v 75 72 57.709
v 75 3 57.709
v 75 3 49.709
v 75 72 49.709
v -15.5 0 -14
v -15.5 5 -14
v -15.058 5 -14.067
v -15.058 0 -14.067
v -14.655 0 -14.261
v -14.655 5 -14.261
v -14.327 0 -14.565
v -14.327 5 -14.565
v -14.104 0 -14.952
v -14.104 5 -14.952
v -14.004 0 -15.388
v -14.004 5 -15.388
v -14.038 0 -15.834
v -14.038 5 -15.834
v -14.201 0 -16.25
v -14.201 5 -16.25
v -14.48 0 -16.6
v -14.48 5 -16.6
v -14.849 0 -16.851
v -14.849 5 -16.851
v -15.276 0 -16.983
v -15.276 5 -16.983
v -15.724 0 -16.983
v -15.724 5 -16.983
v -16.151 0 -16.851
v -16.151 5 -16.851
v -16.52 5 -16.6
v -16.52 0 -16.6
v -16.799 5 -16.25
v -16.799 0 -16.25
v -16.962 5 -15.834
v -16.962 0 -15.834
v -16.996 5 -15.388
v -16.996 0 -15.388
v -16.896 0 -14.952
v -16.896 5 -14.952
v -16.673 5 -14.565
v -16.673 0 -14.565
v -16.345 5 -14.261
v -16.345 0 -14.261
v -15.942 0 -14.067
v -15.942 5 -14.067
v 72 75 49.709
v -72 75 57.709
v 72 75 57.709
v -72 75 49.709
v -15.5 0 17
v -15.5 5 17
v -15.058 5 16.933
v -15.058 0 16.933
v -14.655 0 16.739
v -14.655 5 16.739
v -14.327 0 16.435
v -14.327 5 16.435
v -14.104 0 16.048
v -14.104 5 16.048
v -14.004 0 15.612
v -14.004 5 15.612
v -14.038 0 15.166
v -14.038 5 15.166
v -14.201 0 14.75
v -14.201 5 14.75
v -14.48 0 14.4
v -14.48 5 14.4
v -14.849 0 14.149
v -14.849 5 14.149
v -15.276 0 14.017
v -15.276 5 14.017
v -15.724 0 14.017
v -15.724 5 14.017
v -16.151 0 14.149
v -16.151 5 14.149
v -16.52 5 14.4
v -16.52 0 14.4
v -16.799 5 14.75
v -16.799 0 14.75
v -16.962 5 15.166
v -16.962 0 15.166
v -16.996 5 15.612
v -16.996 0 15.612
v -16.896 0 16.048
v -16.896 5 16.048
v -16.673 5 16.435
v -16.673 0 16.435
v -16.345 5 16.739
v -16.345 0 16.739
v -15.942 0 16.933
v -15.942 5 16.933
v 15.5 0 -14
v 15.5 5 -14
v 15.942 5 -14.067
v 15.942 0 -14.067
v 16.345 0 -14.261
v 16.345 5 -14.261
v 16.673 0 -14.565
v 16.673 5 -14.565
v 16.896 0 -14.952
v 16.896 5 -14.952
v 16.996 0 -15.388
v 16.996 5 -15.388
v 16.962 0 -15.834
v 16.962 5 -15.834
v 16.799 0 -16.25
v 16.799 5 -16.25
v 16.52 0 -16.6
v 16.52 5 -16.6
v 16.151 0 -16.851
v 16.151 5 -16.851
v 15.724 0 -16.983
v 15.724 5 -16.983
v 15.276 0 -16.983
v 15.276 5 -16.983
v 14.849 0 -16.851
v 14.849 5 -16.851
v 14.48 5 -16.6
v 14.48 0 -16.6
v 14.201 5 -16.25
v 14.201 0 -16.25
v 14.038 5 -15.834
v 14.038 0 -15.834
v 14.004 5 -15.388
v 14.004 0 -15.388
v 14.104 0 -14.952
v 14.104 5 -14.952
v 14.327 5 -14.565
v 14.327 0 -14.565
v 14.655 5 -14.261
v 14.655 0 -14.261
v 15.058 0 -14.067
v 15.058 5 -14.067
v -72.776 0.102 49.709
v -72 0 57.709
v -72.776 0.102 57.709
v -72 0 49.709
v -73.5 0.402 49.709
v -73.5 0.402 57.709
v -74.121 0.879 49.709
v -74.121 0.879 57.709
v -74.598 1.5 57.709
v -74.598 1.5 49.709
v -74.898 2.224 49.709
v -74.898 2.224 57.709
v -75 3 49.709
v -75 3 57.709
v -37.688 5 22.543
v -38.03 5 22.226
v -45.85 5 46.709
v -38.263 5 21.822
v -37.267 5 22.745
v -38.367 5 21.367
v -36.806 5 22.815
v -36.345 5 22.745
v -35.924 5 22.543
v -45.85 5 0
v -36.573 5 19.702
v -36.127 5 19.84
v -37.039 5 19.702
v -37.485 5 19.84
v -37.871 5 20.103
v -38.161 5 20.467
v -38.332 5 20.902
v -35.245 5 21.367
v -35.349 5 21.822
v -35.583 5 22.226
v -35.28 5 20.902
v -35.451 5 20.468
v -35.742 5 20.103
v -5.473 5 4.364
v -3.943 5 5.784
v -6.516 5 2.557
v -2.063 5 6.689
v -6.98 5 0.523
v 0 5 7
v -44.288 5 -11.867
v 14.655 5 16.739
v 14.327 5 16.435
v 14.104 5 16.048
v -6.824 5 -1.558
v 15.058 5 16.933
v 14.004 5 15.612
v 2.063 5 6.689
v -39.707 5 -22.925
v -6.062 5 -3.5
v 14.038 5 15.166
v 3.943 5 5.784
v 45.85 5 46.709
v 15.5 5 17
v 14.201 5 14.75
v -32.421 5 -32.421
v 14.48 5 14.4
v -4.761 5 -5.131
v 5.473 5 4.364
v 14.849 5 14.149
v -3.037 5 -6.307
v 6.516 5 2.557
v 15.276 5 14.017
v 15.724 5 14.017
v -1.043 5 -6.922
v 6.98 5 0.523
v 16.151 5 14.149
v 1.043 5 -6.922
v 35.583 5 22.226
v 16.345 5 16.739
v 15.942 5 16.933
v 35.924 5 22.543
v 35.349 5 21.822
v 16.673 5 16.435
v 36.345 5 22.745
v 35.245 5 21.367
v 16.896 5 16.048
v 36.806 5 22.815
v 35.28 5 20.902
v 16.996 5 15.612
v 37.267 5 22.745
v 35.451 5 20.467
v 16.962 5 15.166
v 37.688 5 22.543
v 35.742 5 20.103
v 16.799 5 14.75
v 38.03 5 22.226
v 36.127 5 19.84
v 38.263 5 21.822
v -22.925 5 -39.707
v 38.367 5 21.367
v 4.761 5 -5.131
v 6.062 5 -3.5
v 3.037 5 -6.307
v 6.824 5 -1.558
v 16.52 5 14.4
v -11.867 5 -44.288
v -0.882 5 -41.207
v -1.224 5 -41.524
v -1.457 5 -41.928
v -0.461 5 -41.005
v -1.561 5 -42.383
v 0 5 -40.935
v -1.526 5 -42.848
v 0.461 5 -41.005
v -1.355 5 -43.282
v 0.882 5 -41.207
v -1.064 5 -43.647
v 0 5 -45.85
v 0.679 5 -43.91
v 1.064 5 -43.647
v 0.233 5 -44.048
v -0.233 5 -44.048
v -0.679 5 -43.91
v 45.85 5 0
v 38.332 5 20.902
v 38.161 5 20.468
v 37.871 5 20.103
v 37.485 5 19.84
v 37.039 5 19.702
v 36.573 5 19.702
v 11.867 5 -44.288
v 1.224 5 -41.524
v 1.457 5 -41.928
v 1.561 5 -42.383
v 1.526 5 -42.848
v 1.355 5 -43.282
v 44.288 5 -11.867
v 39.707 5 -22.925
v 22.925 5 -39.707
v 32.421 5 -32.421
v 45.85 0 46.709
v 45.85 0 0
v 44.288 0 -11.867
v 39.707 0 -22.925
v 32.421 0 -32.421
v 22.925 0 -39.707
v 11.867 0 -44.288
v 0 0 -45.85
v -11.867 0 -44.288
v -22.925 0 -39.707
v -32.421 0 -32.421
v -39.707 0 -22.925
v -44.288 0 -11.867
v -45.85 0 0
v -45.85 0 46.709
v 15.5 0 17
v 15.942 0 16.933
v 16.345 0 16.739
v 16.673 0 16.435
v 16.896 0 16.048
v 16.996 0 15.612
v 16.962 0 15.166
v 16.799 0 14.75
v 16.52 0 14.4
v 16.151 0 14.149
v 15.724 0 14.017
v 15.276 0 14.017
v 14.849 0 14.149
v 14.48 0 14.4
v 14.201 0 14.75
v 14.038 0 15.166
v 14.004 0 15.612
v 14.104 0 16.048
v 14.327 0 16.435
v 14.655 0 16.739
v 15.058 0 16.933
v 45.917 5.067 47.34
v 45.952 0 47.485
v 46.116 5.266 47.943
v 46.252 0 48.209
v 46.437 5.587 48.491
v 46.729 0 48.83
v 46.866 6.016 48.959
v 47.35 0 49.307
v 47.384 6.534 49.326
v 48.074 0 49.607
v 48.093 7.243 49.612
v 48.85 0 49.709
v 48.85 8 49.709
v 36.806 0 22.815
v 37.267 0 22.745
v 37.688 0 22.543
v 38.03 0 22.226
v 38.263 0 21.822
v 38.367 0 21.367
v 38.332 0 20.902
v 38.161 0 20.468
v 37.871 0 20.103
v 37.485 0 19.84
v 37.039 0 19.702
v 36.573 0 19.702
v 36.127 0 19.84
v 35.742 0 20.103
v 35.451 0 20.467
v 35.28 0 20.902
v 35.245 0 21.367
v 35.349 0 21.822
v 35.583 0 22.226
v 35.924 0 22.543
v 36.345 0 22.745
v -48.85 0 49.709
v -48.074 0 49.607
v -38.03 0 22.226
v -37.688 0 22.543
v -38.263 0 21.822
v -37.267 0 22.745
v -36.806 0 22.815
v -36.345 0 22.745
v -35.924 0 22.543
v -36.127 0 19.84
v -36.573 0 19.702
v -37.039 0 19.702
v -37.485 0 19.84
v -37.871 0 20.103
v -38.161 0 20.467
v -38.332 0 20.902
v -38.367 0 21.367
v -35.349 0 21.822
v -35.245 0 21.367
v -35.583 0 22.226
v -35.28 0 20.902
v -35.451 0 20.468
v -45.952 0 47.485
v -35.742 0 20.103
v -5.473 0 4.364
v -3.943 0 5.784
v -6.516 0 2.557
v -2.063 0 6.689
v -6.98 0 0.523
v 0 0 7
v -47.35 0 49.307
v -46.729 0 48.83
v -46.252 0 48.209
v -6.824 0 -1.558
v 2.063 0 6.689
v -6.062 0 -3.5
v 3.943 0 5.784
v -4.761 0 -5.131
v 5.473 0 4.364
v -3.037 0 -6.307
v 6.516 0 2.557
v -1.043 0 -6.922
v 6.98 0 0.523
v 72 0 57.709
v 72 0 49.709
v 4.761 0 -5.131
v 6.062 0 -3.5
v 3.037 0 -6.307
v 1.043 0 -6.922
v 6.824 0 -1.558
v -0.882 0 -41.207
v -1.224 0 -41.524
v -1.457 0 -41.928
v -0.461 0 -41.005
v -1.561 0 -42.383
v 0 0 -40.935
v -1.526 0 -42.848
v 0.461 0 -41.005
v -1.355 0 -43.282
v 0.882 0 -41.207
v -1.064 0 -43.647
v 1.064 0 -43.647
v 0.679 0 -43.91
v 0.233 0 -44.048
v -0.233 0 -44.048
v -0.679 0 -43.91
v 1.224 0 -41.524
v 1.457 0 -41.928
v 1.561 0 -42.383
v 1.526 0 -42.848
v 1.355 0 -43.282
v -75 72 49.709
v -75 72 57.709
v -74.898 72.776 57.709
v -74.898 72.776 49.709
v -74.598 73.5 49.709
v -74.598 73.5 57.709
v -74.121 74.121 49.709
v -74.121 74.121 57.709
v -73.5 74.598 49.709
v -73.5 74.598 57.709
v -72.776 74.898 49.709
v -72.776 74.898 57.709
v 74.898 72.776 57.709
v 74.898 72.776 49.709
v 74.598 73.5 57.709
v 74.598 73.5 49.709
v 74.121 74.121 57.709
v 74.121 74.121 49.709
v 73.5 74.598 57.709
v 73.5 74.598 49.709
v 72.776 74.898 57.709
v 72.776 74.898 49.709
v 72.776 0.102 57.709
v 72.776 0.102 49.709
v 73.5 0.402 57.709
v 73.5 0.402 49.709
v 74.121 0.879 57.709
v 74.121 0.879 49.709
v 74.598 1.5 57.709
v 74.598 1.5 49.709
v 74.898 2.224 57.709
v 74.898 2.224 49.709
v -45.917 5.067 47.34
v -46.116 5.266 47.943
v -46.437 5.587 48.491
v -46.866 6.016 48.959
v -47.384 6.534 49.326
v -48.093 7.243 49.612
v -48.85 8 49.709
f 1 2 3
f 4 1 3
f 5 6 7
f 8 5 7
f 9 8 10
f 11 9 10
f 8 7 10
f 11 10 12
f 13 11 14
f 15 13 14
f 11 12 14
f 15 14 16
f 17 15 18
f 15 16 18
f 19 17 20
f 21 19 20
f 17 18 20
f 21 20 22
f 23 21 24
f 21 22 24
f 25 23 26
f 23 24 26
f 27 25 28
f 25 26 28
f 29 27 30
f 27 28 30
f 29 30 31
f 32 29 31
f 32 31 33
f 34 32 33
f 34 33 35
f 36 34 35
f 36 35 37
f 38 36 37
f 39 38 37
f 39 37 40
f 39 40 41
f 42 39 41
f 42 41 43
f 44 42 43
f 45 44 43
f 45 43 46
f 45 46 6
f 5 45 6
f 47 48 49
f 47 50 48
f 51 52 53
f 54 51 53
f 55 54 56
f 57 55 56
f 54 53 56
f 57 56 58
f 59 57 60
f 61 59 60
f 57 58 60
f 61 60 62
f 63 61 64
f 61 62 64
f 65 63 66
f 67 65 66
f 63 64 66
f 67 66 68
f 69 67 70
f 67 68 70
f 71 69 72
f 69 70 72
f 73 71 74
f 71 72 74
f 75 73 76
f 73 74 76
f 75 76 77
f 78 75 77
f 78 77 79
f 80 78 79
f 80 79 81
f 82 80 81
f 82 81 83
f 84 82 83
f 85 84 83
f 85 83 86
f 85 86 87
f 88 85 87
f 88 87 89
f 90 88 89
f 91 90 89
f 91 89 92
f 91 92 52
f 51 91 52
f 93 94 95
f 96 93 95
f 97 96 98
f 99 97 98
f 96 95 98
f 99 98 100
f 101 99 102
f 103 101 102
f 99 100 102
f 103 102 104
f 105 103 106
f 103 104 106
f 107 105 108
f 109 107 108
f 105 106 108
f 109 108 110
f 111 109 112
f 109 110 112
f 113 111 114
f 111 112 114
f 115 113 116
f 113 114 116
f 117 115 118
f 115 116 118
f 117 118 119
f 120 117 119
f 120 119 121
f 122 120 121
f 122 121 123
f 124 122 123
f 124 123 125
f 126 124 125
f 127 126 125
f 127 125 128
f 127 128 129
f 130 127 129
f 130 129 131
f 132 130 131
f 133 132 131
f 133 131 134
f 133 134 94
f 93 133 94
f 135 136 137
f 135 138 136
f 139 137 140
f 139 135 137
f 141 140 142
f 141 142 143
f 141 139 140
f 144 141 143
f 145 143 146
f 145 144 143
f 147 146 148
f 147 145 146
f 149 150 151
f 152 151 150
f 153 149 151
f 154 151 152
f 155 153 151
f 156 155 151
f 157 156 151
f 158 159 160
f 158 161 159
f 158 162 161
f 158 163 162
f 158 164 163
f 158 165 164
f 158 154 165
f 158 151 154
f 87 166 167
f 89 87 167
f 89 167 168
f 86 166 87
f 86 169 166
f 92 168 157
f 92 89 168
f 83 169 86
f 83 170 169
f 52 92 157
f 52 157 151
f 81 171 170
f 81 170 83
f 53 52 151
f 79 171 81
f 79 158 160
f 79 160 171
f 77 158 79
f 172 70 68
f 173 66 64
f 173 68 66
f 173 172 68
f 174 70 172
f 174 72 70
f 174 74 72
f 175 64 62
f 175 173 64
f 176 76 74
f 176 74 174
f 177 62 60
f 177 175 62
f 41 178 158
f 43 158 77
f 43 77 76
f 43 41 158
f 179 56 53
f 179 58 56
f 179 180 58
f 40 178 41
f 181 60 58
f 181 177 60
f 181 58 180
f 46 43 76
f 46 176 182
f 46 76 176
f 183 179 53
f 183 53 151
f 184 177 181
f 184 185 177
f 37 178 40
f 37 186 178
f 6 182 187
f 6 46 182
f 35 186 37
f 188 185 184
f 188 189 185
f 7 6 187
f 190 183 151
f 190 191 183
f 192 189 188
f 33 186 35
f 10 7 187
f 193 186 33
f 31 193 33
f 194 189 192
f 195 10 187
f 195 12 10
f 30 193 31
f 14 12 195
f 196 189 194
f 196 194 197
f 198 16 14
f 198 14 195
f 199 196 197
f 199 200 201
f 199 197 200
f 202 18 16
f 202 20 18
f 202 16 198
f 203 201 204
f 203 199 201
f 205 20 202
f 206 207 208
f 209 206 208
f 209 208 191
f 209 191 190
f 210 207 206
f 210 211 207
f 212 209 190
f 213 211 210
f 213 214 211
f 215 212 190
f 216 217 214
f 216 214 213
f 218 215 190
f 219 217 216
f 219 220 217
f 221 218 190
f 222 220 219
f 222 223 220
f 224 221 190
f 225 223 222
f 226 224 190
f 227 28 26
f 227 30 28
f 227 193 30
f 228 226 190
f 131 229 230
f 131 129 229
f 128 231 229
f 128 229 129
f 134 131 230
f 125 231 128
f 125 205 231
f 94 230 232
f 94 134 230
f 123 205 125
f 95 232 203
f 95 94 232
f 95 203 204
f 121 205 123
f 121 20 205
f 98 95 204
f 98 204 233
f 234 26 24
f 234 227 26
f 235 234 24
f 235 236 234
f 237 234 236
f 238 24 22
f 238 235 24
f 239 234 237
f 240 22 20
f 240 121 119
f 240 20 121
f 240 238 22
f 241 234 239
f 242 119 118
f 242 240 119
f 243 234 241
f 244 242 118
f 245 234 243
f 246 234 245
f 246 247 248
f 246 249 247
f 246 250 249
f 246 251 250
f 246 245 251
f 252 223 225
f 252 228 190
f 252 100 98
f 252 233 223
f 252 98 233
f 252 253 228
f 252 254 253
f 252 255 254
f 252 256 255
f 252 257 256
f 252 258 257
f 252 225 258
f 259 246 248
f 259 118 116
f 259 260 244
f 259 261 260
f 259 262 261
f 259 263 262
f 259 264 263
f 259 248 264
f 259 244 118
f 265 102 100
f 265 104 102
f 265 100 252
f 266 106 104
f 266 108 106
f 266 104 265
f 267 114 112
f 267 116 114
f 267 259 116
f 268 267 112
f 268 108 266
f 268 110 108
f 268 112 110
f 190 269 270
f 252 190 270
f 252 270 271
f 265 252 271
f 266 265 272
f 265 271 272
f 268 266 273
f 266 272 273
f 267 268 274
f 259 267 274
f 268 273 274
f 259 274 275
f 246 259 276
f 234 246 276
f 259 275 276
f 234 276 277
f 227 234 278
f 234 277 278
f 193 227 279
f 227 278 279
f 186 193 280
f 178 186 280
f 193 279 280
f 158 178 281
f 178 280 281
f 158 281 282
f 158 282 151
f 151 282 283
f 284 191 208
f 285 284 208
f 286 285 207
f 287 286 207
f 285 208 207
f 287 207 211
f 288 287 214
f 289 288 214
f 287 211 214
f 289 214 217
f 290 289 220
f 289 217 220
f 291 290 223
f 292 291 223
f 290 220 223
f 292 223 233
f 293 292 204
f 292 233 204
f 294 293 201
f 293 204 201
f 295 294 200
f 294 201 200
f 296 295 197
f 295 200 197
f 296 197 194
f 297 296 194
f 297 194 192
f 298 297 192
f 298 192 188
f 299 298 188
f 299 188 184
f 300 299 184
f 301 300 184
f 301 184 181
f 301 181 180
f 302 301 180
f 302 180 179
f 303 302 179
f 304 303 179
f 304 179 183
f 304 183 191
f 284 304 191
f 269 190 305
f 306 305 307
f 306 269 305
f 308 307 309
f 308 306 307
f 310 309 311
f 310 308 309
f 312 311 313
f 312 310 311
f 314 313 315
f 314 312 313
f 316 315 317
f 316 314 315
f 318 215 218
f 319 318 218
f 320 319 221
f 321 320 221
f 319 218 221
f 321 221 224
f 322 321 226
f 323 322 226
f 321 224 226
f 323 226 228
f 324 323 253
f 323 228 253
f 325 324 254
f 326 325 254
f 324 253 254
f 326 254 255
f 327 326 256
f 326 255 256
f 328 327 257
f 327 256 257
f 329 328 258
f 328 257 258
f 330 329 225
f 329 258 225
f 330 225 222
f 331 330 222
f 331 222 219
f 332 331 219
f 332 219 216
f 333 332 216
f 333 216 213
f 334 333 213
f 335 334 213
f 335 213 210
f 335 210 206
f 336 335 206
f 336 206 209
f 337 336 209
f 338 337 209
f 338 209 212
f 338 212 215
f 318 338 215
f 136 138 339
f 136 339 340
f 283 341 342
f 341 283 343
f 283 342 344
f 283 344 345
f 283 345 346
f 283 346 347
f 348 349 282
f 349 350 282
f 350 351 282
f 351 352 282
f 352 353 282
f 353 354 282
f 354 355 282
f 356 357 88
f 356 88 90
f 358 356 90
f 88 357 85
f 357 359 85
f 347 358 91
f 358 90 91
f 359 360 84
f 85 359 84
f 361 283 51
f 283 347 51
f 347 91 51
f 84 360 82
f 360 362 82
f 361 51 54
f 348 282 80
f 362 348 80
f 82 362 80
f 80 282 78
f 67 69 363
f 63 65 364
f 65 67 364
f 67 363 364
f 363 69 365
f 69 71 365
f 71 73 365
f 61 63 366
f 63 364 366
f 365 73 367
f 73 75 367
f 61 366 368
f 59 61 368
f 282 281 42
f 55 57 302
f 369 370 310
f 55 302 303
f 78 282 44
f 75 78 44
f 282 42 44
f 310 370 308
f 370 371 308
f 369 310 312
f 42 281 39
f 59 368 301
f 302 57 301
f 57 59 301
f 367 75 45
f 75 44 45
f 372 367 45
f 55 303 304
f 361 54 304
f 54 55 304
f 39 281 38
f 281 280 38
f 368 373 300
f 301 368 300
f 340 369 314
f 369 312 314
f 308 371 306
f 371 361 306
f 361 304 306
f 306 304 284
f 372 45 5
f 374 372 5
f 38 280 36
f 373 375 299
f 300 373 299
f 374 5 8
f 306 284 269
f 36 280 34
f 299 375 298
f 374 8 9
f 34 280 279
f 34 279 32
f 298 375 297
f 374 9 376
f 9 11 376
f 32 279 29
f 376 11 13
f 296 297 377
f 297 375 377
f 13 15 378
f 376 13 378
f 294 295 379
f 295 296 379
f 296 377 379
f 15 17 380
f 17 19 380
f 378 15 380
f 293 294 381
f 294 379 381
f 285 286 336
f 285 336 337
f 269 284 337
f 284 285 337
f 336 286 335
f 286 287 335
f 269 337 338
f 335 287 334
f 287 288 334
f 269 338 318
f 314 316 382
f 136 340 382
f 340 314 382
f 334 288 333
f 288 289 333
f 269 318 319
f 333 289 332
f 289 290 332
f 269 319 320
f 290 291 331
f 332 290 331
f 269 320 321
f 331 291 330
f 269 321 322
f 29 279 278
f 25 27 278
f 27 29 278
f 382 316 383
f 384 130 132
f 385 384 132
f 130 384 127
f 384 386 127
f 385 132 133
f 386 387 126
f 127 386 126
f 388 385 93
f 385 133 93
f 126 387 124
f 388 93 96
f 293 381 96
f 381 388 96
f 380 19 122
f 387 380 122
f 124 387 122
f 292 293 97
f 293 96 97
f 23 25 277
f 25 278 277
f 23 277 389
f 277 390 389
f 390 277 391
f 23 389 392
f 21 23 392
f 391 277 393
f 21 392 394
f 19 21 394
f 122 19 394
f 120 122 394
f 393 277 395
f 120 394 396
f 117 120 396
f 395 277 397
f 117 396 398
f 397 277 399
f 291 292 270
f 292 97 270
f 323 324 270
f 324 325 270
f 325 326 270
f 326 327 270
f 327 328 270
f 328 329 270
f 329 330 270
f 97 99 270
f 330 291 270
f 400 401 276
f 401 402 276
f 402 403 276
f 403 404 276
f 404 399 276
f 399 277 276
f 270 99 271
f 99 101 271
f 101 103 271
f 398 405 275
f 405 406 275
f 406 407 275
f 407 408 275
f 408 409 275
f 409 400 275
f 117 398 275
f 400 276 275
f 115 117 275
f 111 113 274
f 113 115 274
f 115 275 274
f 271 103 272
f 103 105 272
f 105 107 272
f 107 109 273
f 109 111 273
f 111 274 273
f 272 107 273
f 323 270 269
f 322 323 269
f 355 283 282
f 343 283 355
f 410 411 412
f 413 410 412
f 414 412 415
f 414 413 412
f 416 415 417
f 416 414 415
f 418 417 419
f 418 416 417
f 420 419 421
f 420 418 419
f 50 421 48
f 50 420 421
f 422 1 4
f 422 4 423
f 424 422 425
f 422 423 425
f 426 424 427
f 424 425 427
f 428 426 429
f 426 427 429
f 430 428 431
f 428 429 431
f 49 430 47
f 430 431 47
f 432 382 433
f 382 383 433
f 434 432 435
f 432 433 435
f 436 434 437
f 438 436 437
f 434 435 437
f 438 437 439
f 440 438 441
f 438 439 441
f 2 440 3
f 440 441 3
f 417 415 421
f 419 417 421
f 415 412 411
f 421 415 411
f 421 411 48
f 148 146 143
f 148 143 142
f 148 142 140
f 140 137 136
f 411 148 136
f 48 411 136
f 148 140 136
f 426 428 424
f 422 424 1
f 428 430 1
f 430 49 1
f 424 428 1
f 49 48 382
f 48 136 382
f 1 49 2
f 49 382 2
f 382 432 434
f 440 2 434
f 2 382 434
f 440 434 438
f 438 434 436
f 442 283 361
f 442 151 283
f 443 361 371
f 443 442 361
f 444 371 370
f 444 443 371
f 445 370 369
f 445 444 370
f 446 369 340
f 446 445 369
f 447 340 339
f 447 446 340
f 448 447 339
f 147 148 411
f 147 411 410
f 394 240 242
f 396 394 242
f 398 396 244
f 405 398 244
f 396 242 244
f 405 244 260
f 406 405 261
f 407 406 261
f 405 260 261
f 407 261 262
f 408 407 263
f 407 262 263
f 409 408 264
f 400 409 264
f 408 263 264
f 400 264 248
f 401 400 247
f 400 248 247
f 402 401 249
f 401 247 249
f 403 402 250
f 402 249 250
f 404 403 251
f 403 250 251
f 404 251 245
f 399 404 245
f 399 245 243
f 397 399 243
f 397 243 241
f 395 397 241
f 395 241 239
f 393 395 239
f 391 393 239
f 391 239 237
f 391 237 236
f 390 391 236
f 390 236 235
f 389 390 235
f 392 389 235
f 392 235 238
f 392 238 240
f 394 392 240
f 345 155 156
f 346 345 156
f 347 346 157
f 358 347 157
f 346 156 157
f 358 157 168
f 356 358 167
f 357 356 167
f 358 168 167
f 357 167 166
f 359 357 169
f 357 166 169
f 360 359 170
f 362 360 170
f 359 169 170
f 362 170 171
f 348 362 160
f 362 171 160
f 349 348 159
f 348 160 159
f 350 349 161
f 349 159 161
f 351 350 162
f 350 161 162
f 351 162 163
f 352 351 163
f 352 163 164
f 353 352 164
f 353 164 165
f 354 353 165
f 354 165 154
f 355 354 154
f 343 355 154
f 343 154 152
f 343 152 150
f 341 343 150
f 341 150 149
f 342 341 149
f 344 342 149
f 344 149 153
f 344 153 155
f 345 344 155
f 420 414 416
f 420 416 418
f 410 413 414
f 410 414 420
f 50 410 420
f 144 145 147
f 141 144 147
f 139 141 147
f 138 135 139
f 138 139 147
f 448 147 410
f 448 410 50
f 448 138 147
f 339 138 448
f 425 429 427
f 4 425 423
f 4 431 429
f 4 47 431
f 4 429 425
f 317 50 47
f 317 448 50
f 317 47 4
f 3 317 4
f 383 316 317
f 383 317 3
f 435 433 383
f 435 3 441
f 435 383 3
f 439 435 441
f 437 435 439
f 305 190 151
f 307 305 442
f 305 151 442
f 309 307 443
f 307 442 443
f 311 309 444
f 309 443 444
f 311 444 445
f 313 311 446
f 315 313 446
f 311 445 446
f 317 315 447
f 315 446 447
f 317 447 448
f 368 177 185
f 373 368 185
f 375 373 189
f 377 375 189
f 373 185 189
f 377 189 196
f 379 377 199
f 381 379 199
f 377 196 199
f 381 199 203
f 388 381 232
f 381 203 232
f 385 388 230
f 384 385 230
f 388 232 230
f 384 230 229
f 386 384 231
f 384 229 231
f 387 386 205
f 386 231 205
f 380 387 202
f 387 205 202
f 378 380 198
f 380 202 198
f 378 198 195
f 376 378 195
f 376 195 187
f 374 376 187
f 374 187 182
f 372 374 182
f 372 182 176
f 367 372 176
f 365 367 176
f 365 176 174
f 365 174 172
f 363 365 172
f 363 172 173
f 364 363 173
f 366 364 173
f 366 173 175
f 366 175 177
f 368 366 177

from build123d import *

# Parameters (mm, degrees)
SKETCH1_R           = 45.85
BOSS_EXTRUDE1_DEPTH = 5
SKETCH2_R           = 1.565
CUT_EXTRUDE1_DEPTH  = 10
SKETCH3_R           = 1.5
SKETCH3_R_2         = 7
CUT_EXTRUDE2_DEPTH  = 10
BOSS_EXTRUDE2_START = -5
BOSS_EXTRUDE2_DEPTH = 5
SKETCH5_W           = 150
SKETCH5_H           = 8
BOSS_EXTRUDE3_DEPTH = 75
FILLET1_R           = 3
FILLET2_R           = 3


with BuildPart() as part:
    # Sketch1 → Boss-Extrude1 (new body)
    with BuildSketch(Plane(origin=(0, 0, 0), x_dir=(1, 0, 0), z_dir=(0, 1, 0))):
        with Locations(Location((0, 0, 0), (0, 0, 270))):
            Circle(SKETCH1_R)
    extrude(amount=BOSS_EXTRUDE1_DEPTH)

    # Sketch2 → Cut-Extrude1 (cut)
    with BuildSketch(Plane(origin=(0, 5, 0), x_dir=(1, 0, 0), z_dir=(0, 1, 0))):
        with Locations(Location((0, 42.5, 0), (0, 0, 270))):
            Circle(SKETCH2_R)
        with Locations(Location((36.806079661, -21.25, 0), (0, 0, 270))):
            Circle(SKETCH2_R)
        with Locations(Location((-36.806079661, -21.25, 0), (0, 0, 270))):
            Circle(SKETCH2_R)
    extrude(amount=-CUT_EXTRUDE1_DEPTH, mode=Mode.SUBTRACT)

    # Sketch3 → Cut-Extrude2 (cut)
    with BuildSketch(Plane(origin=(0, 5, 0), x_dir=(1, 0, 0), z_dir=(0, 1, 0))):
        with Locations(Location((-15.5, 15.5, 0), (0, 0, 270))):
            Circle(SKETCH3_R)
        with Locations(Location((15.5, 15.5, 0), (0, 0, 270))):
            Circle(SKETCH3_R)
        with Locations(Location((15.5, -15.5, 0), (0, 0, 270))):
            Circle(SKETCH3_R)
        with Locations(Location((-15.5, -15.5, 0), (0, 0, 270))):
            Circle(SKETCH3_R)
        with Locations(Location((0, 0, 0), (0, 0, 270))):
            Circle(SKETCH3_R_2)
    extrude(amount=-CUT_EXTRUDE2_DEPTH, mode=Mode.SUBTRACT)

    # Sketch4 → Boss-Extrude2 (add)
    with BuildSketch(Plane(origin=(0, 5, 0), x_dir=(1, 0, 0), z_dir=(0, 1, 0)).offset(BOSS_EXTRUDE2_START)):
        with BuildLine():
            Line((-45.85, 0), (-45.85, -57.708767277))
            Line((-45.85, -57.708767277), (45.85, -57.708767277))
            Line((45.85, -57.708767277), (45.85, 0))
            ThreePointArc((45.85, 0), (0, -45.85), (-45.85, 0))
        make_face()
    extrude(amount=BOSS_EXTRUDE2_DEPTH)

    # Sketch5 → Boss-Extrude3 (add)
    with BuildSketch(Plane(origin=(0, 0, 0), x_dir=(1, 0, 0), z_dir=(0, 1, 0))):
        with Locations((0, -53.708767277)):
            Rectangle(SKETCH5_W, SKETCH5_H)
    extrude(amount=BOSS_EXTRUDE3_DEPTH)

    # Fillet1
    fillet1_edges = [part.edges().sort_by_distance(p)[0] for p in [
        (-45.85, 2.5, 49.708767277),
        (0, 5, 49.708767277),
        (45.85, 2.5, 49.708767277),
    ]]
    fillet(fillet1_edges, radius=FILLET1_R)

    # Fillet2
    fillet2_edges = [part.edges().sort_by_distance(p)[0] for p in [
        (-75, 0, 53.708767277),
        (75, 0, 53.708767277),
        (-75, 75, 53.708767277),
        (75, 75, 53.708767277),
    ]]
    fillet(fillet2_edges, radius=FILLET2_R)


solid = part.part
